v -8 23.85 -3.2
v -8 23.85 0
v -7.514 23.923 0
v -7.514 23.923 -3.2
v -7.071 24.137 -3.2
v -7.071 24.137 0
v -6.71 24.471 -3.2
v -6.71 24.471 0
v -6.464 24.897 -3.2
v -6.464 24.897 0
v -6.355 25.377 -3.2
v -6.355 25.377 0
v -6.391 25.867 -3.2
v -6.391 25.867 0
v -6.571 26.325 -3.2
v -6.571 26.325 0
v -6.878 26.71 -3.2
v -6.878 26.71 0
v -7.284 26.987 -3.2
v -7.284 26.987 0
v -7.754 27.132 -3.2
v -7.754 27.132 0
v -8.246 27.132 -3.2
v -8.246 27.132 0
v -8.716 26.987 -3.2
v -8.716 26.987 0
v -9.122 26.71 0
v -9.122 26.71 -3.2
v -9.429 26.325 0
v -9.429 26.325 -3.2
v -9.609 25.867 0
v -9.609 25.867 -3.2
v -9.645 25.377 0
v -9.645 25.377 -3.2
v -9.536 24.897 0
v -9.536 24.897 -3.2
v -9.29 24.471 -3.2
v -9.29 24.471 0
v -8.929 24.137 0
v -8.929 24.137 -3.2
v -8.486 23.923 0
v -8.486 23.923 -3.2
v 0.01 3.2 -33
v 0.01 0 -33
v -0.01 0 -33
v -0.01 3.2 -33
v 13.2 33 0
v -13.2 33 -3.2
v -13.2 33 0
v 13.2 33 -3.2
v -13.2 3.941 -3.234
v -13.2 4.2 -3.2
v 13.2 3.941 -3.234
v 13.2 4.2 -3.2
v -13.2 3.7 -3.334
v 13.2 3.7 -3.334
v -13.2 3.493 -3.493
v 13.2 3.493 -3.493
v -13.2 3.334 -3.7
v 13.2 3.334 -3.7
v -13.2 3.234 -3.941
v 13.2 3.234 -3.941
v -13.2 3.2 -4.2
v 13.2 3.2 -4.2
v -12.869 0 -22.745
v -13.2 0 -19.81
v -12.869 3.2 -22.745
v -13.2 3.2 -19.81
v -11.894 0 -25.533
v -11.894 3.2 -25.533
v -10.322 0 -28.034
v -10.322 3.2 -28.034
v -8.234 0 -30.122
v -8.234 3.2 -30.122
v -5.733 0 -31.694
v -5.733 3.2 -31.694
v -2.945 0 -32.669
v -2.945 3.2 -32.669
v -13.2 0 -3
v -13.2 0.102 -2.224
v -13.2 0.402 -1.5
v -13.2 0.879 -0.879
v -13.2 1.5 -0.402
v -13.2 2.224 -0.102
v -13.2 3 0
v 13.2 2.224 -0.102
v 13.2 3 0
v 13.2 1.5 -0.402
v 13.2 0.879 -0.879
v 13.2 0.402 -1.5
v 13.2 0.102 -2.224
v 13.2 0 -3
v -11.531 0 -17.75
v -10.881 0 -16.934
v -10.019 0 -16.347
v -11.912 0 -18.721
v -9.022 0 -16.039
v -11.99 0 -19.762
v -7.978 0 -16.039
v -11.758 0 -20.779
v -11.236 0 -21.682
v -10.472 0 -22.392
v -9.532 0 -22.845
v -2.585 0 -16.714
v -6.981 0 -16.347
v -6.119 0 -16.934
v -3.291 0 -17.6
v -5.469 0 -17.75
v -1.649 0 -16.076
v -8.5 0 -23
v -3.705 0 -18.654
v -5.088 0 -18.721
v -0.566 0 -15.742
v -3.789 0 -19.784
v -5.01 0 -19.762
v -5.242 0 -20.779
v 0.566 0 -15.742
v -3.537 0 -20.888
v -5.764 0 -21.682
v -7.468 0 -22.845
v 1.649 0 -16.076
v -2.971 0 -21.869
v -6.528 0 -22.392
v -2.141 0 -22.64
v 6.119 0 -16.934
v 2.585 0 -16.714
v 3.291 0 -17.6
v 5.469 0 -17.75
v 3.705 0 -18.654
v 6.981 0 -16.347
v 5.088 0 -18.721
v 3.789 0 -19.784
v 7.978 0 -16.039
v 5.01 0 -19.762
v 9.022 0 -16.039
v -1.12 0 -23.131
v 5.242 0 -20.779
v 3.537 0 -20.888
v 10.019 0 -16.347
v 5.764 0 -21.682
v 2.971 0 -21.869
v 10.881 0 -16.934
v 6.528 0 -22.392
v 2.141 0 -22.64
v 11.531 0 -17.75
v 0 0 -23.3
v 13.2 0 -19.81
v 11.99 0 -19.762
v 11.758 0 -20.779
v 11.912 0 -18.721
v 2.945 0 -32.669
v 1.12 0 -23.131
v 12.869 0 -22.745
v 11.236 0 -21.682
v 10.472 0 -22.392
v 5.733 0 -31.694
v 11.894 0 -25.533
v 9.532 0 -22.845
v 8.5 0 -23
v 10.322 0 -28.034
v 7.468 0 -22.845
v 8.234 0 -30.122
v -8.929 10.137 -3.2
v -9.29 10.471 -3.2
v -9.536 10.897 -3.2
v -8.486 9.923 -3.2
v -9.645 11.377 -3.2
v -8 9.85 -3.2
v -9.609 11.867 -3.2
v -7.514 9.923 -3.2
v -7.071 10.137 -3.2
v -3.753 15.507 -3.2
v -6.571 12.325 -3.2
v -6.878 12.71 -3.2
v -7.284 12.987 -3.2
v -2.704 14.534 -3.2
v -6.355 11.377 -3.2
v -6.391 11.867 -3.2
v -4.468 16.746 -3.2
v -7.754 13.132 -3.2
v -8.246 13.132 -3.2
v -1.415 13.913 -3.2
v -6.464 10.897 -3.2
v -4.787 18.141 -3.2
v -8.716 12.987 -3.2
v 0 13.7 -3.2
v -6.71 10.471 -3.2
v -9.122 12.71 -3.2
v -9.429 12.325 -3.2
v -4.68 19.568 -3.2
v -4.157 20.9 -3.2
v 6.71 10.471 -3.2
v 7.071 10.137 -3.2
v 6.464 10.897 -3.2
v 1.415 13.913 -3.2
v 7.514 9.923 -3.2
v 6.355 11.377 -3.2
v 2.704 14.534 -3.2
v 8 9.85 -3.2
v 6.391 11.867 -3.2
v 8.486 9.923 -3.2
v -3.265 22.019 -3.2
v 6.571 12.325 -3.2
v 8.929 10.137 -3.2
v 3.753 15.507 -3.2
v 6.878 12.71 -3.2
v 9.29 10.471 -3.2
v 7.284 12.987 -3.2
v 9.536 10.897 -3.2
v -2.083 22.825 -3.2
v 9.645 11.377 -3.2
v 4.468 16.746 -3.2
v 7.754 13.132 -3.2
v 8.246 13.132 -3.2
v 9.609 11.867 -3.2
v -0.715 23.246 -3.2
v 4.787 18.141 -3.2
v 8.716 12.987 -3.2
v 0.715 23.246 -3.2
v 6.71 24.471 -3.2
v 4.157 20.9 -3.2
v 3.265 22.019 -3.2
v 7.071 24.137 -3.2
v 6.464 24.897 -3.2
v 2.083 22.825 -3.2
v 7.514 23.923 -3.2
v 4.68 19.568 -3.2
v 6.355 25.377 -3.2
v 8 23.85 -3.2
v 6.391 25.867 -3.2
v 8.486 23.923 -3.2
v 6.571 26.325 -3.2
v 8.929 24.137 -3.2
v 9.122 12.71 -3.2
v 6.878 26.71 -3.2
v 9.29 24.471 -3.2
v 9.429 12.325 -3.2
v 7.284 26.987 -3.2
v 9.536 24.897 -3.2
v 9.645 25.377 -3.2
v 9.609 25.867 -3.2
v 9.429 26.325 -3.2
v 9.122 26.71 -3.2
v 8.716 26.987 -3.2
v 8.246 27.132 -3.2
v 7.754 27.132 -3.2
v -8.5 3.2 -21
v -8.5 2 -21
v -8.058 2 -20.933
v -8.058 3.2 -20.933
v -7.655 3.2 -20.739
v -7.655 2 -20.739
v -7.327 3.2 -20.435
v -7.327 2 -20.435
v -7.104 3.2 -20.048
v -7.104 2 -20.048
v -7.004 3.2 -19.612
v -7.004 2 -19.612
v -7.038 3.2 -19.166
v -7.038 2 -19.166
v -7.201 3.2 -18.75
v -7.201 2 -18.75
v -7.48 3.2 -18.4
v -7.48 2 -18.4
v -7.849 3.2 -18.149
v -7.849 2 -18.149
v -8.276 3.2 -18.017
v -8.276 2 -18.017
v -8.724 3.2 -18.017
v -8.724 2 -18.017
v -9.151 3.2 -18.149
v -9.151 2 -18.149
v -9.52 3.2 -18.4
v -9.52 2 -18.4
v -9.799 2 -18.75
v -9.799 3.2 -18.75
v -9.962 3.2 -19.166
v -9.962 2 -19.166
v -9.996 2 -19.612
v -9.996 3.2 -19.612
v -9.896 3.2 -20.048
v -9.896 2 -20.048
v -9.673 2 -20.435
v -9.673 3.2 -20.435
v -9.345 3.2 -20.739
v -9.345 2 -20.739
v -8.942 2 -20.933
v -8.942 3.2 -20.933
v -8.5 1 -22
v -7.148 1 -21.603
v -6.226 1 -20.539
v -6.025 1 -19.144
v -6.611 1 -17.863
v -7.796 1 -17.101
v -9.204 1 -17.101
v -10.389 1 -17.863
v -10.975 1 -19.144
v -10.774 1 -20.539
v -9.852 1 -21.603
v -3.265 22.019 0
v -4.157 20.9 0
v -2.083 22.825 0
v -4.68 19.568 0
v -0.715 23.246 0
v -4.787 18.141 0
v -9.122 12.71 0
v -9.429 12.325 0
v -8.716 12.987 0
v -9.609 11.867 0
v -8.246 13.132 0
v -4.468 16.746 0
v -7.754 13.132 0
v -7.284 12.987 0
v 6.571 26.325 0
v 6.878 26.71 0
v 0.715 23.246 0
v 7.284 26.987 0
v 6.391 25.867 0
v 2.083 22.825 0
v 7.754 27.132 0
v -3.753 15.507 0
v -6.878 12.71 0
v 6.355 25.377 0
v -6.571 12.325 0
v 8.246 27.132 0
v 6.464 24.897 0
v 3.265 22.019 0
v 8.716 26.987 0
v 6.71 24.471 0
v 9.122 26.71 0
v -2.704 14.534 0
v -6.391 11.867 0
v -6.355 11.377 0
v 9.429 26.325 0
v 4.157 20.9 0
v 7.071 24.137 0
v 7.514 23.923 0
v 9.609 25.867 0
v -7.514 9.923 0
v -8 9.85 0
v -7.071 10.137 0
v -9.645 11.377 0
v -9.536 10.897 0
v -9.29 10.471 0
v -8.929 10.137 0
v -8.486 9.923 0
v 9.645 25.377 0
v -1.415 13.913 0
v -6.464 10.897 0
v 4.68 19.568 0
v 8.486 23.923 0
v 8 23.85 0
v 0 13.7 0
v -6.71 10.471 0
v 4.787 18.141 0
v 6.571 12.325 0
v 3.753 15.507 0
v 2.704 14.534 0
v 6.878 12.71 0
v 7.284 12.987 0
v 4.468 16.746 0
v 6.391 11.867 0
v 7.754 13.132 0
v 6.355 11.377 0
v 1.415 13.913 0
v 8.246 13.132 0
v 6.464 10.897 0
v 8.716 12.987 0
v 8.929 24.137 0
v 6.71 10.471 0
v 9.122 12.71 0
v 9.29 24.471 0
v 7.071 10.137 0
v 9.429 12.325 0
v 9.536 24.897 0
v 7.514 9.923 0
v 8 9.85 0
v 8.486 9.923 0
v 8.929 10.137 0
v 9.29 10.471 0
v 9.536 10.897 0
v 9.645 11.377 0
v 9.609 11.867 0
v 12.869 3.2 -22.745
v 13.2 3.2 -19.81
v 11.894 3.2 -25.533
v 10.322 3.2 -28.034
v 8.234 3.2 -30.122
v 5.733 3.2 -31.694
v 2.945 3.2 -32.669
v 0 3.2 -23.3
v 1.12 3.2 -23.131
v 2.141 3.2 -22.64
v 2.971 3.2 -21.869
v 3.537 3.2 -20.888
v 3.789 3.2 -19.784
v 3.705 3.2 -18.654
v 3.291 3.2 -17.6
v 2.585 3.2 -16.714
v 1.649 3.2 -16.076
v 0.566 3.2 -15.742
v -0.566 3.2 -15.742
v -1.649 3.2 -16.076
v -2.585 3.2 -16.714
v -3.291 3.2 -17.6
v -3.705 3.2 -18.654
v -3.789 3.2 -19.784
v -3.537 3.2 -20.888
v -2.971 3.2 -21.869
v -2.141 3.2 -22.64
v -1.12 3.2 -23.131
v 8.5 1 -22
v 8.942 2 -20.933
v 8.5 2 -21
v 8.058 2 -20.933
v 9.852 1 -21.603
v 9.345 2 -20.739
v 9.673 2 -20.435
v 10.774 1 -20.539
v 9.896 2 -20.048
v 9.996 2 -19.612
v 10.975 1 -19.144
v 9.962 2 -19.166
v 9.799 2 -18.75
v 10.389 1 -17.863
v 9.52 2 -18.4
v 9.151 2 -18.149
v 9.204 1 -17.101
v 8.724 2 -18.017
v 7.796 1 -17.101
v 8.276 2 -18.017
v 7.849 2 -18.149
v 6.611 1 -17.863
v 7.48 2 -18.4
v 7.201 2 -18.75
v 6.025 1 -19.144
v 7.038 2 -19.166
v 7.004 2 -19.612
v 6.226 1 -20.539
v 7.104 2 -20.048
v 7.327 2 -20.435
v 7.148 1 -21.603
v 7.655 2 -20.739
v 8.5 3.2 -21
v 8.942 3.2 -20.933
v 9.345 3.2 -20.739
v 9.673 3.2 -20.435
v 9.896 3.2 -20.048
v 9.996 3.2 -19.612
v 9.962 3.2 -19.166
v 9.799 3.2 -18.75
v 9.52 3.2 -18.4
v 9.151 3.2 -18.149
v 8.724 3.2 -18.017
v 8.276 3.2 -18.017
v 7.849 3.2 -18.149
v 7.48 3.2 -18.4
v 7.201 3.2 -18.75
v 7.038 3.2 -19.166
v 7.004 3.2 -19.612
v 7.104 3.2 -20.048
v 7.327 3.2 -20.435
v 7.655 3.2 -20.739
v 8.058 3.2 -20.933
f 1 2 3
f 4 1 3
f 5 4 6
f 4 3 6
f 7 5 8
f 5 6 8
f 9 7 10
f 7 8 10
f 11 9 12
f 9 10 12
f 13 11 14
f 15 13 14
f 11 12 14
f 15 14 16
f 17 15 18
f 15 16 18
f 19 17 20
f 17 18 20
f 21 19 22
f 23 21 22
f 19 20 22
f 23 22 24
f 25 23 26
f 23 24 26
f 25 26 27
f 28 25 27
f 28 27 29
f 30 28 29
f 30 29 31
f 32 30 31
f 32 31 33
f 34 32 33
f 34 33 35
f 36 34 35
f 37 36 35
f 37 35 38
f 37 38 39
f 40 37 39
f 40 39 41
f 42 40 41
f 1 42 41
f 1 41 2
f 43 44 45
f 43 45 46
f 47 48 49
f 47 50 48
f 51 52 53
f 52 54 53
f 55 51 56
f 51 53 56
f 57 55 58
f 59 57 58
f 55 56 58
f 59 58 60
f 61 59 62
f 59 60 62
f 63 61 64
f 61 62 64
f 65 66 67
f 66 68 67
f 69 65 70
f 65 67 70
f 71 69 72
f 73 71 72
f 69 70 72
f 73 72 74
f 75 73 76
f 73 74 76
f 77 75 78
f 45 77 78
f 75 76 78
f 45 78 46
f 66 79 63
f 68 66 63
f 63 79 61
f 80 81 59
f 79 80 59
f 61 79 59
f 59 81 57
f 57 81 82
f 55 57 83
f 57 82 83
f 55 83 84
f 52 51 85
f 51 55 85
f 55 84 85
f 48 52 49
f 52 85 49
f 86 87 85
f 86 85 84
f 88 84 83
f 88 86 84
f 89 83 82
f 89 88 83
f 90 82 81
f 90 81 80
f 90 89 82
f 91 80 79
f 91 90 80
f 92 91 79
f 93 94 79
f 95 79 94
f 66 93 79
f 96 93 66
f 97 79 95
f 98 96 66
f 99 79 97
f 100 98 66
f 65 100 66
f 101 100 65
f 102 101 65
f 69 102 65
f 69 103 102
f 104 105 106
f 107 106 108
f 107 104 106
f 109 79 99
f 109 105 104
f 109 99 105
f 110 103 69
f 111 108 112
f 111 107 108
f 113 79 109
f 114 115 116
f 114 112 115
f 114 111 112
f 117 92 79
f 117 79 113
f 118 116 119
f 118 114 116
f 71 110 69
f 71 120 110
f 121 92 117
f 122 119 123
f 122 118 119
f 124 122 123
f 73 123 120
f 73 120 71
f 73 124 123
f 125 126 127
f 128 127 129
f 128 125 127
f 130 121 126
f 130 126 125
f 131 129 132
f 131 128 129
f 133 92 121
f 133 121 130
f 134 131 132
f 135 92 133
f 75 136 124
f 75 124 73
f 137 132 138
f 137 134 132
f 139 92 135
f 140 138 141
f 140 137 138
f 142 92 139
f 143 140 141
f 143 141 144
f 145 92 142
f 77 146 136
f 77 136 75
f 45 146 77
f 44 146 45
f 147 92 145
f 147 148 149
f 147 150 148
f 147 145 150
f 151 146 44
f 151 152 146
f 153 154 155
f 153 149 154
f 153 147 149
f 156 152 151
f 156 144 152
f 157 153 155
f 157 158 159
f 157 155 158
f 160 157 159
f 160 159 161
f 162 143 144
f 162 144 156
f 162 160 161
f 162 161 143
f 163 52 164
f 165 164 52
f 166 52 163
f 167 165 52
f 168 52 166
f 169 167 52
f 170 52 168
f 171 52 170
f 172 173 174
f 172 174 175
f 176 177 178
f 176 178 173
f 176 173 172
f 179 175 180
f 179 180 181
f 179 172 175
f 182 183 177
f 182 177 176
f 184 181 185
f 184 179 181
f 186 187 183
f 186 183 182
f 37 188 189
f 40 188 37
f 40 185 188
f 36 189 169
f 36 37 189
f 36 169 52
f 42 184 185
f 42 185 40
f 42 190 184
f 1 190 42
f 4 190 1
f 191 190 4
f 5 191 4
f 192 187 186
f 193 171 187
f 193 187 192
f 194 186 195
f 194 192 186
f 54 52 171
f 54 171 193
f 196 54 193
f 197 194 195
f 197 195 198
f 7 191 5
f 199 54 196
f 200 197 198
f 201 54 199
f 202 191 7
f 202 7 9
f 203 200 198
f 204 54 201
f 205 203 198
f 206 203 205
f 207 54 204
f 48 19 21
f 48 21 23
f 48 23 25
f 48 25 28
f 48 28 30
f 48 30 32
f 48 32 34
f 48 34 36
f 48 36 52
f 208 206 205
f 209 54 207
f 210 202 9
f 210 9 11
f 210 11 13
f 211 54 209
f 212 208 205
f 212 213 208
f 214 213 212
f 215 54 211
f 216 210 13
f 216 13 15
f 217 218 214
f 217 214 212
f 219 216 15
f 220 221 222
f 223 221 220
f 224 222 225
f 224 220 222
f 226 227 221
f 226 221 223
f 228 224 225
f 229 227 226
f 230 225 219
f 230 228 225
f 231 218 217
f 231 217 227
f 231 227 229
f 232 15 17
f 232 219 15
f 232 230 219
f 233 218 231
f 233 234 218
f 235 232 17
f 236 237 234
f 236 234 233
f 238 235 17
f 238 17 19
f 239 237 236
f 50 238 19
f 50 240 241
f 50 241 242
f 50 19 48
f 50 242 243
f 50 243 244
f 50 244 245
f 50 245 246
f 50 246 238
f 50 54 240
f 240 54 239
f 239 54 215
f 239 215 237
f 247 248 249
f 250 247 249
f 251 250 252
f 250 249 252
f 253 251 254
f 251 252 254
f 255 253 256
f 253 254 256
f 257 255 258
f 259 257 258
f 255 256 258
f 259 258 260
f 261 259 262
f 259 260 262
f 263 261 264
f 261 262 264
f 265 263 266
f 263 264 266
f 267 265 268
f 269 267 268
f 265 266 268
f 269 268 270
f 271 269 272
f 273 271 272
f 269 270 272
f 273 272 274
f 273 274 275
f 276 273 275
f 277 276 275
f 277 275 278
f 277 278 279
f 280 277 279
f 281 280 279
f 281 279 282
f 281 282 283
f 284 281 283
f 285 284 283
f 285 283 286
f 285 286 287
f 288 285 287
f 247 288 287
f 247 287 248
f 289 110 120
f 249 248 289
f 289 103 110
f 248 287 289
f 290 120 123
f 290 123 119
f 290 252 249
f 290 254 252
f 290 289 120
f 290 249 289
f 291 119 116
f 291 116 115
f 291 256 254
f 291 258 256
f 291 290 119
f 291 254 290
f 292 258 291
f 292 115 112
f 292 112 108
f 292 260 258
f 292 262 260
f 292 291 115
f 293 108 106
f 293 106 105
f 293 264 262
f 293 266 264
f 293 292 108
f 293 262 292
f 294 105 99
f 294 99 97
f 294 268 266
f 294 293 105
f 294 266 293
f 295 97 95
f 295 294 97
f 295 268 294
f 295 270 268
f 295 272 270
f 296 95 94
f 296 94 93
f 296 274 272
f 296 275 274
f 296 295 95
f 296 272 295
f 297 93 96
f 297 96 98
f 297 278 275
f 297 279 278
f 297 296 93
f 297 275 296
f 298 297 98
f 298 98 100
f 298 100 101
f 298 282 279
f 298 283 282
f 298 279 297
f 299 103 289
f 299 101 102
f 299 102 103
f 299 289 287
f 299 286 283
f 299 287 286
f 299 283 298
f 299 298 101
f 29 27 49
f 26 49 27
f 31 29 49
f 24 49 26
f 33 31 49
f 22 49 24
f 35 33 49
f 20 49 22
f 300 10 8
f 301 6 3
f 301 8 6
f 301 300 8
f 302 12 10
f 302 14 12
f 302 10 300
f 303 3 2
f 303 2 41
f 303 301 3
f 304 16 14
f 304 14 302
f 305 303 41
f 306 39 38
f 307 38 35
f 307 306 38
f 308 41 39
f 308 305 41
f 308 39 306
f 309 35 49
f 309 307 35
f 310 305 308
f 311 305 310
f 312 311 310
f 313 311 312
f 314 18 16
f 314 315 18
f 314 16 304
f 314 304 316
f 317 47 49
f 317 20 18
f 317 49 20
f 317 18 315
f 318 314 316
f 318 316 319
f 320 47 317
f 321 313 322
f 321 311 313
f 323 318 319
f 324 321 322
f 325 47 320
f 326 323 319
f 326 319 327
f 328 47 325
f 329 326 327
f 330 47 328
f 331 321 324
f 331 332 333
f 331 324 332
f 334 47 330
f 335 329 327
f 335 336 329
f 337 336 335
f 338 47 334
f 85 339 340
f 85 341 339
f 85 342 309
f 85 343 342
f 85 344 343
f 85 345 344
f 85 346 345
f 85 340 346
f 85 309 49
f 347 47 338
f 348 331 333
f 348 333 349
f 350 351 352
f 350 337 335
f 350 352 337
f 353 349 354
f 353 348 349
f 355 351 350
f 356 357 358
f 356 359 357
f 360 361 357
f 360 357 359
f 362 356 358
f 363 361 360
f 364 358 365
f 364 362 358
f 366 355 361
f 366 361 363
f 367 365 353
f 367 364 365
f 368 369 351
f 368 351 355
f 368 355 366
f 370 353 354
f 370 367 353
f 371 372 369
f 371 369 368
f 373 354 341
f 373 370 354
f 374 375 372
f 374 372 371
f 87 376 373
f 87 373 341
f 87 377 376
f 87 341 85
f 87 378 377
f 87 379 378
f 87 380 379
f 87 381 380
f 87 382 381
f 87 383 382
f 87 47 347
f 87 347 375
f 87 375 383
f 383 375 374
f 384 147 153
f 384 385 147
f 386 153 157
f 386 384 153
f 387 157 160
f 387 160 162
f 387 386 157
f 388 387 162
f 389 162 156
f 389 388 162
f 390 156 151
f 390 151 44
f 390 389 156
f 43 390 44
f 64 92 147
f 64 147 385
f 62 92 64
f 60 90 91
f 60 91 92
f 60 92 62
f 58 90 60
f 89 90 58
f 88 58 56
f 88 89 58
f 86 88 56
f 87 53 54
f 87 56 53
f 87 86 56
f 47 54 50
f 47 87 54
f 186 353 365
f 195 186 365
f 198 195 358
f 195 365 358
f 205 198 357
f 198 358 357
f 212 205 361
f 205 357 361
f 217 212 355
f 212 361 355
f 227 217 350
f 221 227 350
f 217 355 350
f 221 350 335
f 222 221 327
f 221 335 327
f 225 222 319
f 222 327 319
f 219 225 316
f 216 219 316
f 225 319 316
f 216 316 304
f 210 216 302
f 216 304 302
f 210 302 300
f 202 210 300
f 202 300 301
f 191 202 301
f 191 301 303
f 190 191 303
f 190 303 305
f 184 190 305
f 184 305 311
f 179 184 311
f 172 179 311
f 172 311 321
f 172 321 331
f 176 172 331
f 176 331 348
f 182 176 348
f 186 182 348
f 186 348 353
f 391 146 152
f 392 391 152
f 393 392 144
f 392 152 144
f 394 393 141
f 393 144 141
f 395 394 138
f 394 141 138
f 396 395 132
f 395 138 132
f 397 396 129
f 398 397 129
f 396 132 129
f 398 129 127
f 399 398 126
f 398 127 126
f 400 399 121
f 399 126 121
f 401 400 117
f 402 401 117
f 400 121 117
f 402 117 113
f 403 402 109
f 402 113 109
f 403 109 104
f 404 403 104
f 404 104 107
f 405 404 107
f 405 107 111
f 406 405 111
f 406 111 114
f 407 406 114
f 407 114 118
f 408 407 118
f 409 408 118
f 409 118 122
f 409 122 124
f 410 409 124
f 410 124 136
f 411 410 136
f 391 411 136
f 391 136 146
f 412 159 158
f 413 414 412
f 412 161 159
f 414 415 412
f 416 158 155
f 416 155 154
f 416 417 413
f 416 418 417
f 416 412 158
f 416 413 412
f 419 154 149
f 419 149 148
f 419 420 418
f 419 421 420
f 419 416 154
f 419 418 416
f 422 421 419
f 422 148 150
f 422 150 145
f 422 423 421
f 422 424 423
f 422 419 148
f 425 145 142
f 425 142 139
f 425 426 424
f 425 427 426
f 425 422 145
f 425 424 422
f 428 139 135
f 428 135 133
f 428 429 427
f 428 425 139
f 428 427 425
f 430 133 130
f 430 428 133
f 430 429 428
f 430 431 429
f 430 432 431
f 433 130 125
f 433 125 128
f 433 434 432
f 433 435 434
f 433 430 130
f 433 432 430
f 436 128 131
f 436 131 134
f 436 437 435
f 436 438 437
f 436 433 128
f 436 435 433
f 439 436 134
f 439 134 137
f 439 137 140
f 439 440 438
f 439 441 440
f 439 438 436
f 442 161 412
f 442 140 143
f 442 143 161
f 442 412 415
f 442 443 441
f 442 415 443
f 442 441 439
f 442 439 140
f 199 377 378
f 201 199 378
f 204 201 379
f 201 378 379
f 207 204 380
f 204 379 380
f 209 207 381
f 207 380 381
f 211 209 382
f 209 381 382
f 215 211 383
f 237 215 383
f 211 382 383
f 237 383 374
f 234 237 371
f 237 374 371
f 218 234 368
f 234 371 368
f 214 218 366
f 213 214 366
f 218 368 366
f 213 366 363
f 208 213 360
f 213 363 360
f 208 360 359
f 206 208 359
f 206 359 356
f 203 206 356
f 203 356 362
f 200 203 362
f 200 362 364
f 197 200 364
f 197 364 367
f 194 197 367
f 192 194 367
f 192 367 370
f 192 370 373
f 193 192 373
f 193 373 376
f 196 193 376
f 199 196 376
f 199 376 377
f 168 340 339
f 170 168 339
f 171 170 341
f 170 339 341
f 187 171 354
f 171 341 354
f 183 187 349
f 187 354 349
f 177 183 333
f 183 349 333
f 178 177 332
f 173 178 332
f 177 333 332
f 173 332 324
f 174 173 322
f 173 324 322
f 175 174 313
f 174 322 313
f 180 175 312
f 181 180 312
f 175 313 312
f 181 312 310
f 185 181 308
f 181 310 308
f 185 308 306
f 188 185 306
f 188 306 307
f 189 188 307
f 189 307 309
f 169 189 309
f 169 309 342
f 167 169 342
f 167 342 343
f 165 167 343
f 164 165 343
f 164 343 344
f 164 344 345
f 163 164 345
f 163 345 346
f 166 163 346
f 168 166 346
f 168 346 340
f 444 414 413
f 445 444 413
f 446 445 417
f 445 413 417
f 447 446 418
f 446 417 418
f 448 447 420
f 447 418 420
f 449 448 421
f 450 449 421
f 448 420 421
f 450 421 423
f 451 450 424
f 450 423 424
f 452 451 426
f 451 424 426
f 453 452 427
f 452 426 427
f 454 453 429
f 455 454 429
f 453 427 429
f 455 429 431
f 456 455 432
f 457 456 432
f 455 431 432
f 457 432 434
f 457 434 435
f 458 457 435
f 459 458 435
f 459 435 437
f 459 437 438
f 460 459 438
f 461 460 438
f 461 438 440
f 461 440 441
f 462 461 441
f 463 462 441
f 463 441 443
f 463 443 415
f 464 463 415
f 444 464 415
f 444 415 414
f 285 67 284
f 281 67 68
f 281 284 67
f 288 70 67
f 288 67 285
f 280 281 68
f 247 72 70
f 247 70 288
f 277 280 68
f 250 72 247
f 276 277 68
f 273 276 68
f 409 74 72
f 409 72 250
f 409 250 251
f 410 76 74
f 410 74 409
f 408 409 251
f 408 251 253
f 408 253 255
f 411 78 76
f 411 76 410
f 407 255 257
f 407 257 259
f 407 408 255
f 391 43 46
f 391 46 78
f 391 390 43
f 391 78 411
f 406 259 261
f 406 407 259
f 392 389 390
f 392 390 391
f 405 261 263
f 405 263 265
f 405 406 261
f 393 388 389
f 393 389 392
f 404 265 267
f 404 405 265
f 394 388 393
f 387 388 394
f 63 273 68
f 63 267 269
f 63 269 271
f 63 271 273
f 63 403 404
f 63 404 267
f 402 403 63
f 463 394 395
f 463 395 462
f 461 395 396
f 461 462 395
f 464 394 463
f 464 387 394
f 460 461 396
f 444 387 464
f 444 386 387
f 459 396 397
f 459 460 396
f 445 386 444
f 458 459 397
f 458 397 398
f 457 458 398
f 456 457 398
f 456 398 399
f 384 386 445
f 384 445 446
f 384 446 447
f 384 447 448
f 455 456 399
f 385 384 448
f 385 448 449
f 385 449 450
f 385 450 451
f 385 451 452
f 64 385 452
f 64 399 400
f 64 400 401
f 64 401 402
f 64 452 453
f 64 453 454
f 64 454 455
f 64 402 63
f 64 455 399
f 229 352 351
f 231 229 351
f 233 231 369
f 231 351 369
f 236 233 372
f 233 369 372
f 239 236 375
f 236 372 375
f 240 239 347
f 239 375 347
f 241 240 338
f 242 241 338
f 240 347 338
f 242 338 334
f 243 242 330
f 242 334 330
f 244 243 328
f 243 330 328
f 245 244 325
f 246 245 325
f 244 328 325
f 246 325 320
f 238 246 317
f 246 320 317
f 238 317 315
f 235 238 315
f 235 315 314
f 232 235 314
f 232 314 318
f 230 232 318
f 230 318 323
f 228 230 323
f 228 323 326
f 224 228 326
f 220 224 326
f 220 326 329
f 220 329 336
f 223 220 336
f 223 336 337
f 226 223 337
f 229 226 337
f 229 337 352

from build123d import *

# Parameters (mm, degrees)
PAD_DEPTH       = 13.2
SKETCH001_R     = 3.8
SKETCH001_R_2   = 1.5
POCKET_DEPTH    = 33.001
SKETCH002_R     = 4.8
SKETCH002_R_2   = 1.65
POCKET001_DEPTH = 33.001
CHAMFER_SIZE    = 2
FILLET_R        = 13.19


with BuildPart() as part:
    # Sketch → Pad (new body, symmetric)
    with BuildSketch(Plane.YZ):
        with BuildLine():
            Line((33, 0), (3, 0))
            ThreePointArc((3, 0), (0.87868, -0.87868), (0, -3))
            Line((0, -3), (0, -33))
            Line((0, -33), (3.2, -33))
            Line((3.2, -33), (3.2, -4.2))
            ThreePointArc((4.2, -3.2), (3.492893, -3.492893), (3.2, -4.2))
            Line((4.2, -3.2), (33, -3.2))
            Line((33, -3.2), (33, 0))
        make_face()
    extrude(amount=PAD_DEPTH, both=True)

    # Sketch001 (on Face5 of Pad) → Pocket (cut, through all)
    with BuildSketch(Plane(origin=(0, 0, 0), x_dir=(0, 0, -1), z_dir=(0, -1, 0))):
        with Locations((19.5, 0)):
            Circle(SKETCH001_R)
        with Locations((19.5, 8.5)):
            Circle(SKETCH001_R_2)
        with Locations((19.5, -8.5)):
            Circle(SKETCH001_R_2)
    extrude(amount=-POCKET_DEPTH, mode=Mode.SUBTRACT)

    # Sketch002 (on Face7 of Pocket) → Pocket001 (cut, through all)
    with BuildSketch(Plane(origin=(0, 0, 0), x_dir=(0, -1, 0), z_dir=(0, 0, 1))):
        with Locations((-18.5, 0)):
            Circle(SKETCH002_R)
        with Locations((-11.5, 8)):
            Circle(SKETCH002_R_2)
        with Locations((-25.5, 8)):
            Circle(SKETCH002_R_2)
        with Locations((-25.5, -8)):
            Circle(SKETCH002_R_2)
        with Locations((-11.5, -8)):
            Circle(SKETCH002_R_2)
    extrude(amount=-POCKET001_DEPTH, mode=Mode.SUBTRACT)

    # Chamfer
    chamfer_edges = [part.edges().sort_by_distance(p)[0] for p in [
        (-8.5, 0, -18),
        (8.5, 0, -18),
    ]]
    chamfer(chamfer_edges, length=CHAMFER_SIZE)

    # Fillet
    fillet_edges = [part.edges().sort_by_distance(p)[0] for p in [
        (-13.2, 1.6, -33),
        (13.2, 1.6, -33),
    ]]
    fillet(fillet_edges, radius=FILLET_R)


solid = part.part
